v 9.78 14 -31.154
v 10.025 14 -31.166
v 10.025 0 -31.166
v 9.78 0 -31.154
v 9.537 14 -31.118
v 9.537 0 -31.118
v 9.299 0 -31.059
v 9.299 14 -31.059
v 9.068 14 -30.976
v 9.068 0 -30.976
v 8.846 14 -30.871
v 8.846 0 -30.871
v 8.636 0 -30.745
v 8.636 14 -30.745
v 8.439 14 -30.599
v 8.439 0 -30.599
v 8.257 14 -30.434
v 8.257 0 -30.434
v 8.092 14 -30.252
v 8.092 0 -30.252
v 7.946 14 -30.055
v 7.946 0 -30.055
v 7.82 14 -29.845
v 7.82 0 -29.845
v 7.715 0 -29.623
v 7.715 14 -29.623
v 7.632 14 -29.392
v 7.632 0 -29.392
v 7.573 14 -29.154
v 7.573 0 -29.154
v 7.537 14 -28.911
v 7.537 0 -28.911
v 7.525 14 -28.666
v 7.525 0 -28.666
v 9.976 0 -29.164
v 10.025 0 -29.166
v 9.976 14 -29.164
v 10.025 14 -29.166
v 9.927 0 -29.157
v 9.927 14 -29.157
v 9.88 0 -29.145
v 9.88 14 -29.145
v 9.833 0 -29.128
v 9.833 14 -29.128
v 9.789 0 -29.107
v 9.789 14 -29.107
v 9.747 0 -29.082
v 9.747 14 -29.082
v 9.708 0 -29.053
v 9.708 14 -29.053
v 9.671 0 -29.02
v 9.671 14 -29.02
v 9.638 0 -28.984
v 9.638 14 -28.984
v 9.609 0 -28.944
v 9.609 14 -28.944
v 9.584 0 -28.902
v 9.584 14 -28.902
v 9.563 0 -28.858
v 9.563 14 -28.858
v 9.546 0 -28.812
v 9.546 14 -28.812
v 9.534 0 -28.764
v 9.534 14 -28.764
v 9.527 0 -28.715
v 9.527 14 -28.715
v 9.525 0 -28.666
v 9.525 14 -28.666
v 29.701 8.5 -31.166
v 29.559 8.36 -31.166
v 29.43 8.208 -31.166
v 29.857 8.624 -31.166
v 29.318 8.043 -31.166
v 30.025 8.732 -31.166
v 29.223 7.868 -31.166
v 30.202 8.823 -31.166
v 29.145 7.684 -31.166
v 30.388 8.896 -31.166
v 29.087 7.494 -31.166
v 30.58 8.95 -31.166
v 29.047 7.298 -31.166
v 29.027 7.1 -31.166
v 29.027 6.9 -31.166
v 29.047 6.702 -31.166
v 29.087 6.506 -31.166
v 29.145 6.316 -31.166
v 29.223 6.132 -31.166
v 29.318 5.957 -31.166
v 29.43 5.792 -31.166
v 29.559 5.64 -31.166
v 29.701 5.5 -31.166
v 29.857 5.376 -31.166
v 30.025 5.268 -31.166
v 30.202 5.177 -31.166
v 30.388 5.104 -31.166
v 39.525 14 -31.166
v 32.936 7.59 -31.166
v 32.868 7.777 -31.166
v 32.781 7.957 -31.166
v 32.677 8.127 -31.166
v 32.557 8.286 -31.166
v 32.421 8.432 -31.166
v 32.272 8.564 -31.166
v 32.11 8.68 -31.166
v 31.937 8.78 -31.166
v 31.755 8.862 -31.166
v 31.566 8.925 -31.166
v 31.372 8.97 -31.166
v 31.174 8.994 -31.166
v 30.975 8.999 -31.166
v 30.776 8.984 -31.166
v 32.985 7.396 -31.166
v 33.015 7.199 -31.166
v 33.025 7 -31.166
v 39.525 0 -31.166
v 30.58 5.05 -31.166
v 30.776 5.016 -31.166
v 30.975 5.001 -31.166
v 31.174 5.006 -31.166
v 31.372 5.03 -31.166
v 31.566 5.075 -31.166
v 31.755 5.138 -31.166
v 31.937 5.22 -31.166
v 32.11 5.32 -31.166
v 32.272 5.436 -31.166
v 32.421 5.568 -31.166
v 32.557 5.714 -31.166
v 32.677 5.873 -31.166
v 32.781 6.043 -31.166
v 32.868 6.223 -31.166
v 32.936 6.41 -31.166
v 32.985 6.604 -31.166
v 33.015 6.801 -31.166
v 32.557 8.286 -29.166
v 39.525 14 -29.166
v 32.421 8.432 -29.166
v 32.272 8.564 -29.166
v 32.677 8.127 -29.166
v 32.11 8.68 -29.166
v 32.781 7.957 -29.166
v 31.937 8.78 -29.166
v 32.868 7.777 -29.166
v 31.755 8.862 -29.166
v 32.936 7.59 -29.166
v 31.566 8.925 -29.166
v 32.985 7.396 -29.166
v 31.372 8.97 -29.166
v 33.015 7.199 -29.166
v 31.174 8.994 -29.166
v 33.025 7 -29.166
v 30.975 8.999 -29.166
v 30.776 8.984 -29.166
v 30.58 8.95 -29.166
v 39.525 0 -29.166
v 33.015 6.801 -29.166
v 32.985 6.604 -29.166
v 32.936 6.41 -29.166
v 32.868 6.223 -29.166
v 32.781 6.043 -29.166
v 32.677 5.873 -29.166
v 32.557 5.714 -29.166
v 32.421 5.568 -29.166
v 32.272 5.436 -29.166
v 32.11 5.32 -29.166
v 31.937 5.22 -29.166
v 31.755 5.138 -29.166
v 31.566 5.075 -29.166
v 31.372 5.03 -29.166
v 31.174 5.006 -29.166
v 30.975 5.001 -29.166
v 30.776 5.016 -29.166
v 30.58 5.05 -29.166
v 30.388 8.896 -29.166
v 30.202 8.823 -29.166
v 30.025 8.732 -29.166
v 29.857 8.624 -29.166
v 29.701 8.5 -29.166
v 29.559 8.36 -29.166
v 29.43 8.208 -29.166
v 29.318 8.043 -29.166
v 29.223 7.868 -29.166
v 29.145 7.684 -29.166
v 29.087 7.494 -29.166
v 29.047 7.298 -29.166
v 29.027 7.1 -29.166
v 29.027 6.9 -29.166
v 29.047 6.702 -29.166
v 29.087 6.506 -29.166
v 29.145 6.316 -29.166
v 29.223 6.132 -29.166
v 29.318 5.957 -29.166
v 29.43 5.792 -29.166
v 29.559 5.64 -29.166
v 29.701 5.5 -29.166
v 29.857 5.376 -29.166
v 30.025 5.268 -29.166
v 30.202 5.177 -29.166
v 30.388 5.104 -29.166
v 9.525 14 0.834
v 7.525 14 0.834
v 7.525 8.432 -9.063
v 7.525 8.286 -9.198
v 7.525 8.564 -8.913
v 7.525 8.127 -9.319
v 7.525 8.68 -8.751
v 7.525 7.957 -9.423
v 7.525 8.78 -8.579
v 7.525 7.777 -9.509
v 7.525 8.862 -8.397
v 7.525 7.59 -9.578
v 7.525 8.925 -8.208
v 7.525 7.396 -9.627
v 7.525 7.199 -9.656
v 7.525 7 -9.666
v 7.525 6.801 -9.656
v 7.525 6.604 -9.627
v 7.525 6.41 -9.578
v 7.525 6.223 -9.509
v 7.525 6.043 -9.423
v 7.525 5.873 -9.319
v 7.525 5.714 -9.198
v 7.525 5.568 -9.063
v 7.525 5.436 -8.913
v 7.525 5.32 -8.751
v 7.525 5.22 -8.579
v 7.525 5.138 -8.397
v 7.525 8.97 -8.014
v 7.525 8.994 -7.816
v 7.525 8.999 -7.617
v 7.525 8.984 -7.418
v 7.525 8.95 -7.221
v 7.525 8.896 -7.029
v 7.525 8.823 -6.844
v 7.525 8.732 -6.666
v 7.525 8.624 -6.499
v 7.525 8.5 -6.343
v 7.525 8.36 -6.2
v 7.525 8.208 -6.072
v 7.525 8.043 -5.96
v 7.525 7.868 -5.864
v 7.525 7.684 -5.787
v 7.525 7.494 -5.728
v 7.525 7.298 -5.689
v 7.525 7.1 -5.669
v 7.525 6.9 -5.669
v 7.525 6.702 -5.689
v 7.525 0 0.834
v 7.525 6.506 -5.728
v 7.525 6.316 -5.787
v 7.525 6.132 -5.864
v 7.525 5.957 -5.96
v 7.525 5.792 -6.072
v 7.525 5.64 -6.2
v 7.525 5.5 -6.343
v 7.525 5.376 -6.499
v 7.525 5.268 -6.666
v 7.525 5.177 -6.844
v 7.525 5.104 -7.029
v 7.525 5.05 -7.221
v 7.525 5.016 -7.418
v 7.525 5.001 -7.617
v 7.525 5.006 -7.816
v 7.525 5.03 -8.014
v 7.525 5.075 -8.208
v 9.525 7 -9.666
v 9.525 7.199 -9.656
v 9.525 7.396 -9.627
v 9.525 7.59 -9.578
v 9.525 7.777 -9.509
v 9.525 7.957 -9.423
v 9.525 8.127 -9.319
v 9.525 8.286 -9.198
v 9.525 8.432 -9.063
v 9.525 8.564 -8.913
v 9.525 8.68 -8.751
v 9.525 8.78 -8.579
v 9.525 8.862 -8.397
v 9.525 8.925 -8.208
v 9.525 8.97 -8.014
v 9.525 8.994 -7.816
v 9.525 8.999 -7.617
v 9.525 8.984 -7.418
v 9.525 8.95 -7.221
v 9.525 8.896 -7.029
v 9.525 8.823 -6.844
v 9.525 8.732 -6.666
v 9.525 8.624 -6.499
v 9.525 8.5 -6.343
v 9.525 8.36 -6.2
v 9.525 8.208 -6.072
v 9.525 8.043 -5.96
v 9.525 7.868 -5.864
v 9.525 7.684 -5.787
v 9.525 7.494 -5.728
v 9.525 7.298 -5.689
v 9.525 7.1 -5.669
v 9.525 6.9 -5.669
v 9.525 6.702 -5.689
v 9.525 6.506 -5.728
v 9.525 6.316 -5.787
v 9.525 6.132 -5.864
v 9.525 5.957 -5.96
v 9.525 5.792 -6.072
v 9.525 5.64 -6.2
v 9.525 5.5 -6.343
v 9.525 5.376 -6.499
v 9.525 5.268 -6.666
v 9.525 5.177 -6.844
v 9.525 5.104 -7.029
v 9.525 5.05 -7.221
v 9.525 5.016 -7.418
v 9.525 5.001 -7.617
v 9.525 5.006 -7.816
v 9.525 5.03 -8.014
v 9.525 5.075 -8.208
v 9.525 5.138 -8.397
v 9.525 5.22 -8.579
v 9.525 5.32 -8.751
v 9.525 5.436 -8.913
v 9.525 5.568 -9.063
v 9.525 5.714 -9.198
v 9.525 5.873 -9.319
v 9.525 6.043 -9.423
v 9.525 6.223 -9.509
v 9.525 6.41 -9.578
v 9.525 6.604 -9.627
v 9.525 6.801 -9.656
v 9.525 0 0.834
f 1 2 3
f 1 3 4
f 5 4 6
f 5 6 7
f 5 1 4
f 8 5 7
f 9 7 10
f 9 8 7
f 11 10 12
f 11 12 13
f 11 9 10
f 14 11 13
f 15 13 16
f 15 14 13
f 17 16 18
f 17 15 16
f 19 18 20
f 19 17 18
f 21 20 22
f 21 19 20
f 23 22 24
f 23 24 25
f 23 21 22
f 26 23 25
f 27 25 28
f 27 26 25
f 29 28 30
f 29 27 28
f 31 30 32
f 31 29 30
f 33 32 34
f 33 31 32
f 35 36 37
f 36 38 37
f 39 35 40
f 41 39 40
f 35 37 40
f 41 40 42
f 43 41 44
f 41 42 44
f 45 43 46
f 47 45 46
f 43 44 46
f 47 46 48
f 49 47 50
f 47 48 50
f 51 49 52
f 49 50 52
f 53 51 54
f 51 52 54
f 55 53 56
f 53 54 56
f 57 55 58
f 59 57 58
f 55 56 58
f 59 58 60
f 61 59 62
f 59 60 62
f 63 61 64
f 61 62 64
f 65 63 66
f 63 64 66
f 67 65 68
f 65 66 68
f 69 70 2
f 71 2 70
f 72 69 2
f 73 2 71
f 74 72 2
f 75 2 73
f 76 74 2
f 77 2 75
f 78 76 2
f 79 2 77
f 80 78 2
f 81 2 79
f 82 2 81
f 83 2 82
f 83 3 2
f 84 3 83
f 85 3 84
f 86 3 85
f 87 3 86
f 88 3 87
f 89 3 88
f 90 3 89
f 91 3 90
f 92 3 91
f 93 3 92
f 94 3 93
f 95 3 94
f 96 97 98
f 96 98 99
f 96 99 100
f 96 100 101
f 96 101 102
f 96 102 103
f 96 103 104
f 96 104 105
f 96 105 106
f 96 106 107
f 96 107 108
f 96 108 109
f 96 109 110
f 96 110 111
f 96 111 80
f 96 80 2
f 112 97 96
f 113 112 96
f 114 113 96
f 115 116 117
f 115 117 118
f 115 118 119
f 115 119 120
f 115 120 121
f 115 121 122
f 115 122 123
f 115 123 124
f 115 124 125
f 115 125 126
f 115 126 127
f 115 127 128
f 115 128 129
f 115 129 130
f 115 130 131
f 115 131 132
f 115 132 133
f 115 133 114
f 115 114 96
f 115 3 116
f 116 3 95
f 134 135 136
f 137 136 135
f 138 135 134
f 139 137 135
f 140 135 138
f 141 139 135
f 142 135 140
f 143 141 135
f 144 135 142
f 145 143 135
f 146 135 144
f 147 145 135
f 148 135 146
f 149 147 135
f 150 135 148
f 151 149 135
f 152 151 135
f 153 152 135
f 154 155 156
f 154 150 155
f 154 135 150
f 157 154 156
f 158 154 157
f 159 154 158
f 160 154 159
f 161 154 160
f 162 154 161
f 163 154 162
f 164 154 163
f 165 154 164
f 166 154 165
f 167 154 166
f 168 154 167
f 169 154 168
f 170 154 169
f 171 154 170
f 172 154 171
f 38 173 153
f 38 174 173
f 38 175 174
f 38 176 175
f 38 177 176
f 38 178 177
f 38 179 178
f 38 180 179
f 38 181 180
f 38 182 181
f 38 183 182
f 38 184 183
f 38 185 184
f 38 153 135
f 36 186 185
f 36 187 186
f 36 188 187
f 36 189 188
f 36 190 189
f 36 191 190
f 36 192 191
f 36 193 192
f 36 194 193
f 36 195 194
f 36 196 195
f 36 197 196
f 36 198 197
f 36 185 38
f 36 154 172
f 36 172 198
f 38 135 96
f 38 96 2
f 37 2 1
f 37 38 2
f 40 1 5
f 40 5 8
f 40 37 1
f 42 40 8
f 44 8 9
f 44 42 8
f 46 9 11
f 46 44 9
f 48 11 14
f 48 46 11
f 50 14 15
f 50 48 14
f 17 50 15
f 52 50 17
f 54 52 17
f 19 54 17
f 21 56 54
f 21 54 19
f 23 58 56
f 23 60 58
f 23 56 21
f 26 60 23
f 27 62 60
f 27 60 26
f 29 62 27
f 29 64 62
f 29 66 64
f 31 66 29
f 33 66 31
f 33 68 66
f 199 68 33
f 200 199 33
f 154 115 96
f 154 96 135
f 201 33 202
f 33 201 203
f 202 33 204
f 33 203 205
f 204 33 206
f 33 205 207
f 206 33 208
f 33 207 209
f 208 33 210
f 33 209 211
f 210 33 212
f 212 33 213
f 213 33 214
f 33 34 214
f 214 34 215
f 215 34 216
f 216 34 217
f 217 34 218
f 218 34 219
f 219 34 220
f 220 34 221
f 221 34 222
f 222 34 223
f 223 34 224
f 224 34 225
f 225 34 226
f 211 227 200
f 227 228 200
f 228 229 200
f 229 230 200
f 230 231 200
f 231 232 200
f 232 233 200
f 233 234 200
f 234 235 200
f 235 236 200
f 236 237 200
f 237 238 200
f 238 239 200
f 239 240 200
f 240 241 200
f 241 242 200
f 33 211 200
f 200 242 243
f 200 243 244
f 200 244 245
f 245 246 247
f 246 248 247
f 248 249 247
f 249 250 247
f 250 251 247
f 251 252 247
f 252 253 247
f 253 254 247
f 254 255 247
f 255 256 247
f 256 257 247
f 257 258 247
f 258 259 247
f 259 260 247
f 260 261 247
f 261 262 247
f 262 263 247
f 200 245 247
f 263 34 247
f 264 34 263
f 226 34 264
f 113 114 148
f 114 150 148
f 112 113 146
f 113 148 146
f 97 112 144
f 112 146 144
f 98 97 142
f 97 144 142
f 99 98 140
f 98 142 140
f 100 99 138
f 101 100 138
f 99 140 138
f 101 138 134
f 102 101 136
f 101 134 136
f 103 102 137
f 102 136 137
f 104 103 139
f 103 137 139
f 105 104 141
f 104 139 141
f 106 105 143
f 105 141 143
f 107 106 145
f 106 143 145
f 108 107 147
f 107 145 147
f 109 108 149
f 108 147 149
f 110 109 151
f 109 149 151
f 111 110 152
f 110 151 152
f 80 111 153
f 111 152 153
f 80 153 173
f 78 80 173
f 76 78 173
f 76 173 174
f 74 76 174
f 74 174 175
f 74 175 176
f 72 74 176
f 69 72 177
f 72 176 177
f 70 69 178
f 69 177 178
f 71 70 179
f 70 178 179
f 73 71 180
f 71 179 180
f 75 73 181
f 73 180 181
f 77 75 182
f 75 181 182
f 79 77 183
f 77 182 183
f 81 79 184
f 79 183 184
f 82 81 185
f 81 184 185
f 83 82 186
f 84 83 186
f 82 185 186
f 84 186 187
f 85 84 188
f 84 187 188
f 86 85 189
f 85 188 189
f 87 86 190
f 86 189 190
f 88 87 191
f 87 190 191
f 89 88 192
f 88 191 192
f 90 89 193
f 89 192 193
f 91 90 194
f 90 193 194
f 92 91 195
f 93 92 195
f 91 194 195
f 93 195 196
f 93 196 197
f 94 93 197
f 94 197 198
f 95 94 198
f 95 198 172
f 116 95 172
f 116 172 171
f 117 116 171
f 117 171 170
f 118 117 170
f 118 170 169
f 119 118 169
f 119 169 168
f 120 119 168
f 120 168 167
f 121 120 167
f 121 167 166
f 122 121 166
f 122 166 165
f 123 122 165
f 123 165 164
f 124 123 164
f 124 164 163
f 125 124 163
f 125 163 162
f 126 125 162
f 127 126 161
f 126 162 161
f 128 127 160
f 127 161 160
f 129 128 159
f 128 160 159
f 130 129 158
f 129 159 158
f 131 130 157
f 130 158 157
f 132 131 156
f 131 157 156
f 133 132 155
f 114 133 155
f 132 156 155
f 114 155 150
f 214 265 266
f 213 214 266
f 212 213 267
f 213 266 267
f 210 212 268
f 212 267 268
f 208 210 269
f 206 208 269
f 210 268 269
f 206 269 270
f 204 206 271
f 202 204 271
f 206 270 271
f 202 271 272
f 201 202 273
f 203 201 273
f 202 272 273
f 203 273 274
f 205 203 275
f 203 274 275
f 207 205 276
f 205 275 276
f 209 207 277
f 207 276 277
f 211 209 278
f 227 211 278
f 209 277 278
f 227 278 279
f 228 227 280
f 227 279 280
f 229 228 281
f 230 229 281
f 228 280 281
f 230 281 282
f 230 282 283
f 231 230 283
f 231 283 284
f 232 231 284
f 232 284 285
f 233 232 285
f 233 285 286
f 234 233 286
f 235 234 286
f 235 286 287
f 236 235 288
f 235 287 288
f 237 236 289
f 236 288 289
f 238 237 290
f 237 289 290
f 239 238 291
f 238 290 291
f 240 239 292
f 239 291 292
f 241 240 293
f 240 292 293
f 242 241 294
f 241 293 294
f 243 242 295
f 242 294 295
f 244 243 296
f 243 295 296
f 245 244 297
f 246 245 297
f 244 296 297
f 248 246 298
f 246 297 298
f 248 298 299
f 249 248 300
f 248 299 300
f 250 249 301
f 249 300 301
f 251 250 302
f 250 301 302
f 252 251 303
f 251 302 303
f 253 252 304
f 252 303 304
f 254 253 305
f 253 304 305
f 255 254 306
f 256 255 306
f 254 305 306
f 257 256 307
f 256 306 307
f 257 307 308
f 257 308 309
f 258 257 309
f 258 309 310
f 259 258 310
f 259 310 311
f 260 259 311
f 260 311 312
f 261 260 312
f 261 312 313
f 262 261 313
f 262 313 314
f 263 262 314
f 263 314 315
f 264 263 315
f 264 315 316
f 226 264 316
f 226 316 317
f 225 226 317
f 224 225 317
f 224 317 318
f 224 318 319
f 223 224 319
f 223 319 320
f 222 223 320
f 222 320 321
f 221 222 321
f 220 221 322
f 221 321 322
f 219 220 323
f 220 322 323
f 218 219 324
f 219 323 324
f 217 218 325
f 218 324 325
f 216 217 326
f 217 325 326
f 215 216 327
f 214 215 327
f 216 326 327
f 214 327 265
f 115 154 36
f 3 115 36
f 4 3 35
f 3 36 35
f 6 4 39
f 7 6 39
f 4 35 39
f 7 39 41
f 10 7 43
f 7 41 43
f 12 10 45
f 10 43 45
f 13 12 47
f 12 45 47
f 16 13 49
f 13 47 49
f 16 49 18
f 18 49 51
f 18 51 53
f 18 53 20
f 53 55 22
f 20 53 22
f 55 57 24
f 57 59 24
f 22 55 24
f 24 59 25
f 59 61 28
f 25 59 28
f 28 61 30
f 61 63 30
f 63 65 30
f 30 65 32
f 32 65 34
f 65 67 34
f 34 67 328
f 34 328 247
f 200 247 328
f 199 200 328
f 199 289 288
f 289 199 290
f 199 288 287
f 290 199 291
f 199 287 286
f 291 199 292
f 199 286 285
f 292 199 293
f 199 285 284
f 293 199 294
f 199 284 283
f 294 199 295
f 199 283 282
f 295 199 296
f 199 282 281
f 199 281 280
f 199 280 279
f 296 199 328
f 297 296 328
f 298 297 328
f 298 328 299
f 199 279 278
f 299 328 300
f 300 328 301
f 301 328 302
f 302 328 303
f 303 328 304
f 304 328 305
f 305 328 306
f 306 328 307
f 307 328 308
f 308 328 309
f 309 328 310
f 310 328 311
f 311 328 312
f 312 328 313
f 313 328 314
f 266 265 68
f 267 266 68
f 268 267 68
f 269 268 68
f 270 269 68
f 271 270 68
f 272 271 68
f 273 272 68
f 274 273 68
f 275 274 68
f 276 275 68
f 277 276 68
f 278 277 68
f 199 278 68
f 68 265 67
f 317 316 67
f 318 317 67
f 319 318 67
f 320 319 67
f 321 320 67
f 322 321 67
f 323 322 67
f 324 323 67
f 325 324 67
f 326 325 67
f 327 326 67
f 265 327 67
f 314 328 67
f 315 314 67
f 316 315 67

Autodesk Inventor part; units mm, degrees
ref_plane "YZ Plane" through (0, 0, 0) normal (1, 0, 0) x (0, 1, 0)
ref_plane "XZ Plane" through (0, 0, 0) normal (0, 1, 0) x (-1, 0, 0)
ref_plane "XY Plane" through (0, 0, 0) normal (0, 0, 1) x (1, 0, 0)
sketch "Boceto1" plane through (0, 0, 0) normal (0, 1, 0) x (-1, 0, 0)
  line L0 (-7.5247, -31.1664) -> (-7.5247, 0.8336)
  line L1 (-7.5247, 0.8336) -> (-9.5247, 0.8336)
  line L2 (-9.5247, 0.8336) -> (-9.5247, -29.1664)
  line L3 (-7.5247, -31.1664) -> (-39.5247, -31.1664)
  line L4 (-39.5247, -31.1664) -> (-39.5247, -29.1664)
  line L5 (-39.5247, -29.1664) -> (-9.5247, -29.1664)
  dimension "d46" = 32
  dimension "d47" = 2
  dimension "d48" = 30
  dimension "d49" = 32
extrude "Extrusion9" add sketch "Boceto1" along normal blind 14
fillet "Fillet1" radius 0.5 1 edges at (9.5247, 7, -29.1664)
fillet "Fillet2" radius 2.5 1 edges at (7.5247, 7, -31.1664)
sketch "Sketch6" plane through (9.5247, 0, 0.8336) normal (1, 0, 0) x (0, 0, -1)
  circle A0 centre (8.5, 7) radius 2
  line L0 (30, 0) -> (30, 14) projected
  line L1 (0, 0) -> (29.5, 0) projected
  dimension "d54" = 4
  dimension "d55" = 21.5
  dimension "d56" = 7
sketch "Sketch7" plane through (39.5247, 0, -29.1664) normal (0, 0, 1) x (1, 0, 0)
  circle A0 centre (-8.5, 7) radius 2
  line L0 (-29.5, 0) -> (0, 0) projected
  line L1 (-30, 14) -> (-30, 0) projected
  dimension "d57" = 4
  dimension "d58" = 7
  dimension "d59" = 21.5
extrude "Extrusion10" cut sketch "Sketch6" against normal blind 10
extrude "Extrusion11" cut sketch "Sketch7" against normal blind 10
properties part number "Esquina de bandeja" material "Aluminum 1100-H14"
